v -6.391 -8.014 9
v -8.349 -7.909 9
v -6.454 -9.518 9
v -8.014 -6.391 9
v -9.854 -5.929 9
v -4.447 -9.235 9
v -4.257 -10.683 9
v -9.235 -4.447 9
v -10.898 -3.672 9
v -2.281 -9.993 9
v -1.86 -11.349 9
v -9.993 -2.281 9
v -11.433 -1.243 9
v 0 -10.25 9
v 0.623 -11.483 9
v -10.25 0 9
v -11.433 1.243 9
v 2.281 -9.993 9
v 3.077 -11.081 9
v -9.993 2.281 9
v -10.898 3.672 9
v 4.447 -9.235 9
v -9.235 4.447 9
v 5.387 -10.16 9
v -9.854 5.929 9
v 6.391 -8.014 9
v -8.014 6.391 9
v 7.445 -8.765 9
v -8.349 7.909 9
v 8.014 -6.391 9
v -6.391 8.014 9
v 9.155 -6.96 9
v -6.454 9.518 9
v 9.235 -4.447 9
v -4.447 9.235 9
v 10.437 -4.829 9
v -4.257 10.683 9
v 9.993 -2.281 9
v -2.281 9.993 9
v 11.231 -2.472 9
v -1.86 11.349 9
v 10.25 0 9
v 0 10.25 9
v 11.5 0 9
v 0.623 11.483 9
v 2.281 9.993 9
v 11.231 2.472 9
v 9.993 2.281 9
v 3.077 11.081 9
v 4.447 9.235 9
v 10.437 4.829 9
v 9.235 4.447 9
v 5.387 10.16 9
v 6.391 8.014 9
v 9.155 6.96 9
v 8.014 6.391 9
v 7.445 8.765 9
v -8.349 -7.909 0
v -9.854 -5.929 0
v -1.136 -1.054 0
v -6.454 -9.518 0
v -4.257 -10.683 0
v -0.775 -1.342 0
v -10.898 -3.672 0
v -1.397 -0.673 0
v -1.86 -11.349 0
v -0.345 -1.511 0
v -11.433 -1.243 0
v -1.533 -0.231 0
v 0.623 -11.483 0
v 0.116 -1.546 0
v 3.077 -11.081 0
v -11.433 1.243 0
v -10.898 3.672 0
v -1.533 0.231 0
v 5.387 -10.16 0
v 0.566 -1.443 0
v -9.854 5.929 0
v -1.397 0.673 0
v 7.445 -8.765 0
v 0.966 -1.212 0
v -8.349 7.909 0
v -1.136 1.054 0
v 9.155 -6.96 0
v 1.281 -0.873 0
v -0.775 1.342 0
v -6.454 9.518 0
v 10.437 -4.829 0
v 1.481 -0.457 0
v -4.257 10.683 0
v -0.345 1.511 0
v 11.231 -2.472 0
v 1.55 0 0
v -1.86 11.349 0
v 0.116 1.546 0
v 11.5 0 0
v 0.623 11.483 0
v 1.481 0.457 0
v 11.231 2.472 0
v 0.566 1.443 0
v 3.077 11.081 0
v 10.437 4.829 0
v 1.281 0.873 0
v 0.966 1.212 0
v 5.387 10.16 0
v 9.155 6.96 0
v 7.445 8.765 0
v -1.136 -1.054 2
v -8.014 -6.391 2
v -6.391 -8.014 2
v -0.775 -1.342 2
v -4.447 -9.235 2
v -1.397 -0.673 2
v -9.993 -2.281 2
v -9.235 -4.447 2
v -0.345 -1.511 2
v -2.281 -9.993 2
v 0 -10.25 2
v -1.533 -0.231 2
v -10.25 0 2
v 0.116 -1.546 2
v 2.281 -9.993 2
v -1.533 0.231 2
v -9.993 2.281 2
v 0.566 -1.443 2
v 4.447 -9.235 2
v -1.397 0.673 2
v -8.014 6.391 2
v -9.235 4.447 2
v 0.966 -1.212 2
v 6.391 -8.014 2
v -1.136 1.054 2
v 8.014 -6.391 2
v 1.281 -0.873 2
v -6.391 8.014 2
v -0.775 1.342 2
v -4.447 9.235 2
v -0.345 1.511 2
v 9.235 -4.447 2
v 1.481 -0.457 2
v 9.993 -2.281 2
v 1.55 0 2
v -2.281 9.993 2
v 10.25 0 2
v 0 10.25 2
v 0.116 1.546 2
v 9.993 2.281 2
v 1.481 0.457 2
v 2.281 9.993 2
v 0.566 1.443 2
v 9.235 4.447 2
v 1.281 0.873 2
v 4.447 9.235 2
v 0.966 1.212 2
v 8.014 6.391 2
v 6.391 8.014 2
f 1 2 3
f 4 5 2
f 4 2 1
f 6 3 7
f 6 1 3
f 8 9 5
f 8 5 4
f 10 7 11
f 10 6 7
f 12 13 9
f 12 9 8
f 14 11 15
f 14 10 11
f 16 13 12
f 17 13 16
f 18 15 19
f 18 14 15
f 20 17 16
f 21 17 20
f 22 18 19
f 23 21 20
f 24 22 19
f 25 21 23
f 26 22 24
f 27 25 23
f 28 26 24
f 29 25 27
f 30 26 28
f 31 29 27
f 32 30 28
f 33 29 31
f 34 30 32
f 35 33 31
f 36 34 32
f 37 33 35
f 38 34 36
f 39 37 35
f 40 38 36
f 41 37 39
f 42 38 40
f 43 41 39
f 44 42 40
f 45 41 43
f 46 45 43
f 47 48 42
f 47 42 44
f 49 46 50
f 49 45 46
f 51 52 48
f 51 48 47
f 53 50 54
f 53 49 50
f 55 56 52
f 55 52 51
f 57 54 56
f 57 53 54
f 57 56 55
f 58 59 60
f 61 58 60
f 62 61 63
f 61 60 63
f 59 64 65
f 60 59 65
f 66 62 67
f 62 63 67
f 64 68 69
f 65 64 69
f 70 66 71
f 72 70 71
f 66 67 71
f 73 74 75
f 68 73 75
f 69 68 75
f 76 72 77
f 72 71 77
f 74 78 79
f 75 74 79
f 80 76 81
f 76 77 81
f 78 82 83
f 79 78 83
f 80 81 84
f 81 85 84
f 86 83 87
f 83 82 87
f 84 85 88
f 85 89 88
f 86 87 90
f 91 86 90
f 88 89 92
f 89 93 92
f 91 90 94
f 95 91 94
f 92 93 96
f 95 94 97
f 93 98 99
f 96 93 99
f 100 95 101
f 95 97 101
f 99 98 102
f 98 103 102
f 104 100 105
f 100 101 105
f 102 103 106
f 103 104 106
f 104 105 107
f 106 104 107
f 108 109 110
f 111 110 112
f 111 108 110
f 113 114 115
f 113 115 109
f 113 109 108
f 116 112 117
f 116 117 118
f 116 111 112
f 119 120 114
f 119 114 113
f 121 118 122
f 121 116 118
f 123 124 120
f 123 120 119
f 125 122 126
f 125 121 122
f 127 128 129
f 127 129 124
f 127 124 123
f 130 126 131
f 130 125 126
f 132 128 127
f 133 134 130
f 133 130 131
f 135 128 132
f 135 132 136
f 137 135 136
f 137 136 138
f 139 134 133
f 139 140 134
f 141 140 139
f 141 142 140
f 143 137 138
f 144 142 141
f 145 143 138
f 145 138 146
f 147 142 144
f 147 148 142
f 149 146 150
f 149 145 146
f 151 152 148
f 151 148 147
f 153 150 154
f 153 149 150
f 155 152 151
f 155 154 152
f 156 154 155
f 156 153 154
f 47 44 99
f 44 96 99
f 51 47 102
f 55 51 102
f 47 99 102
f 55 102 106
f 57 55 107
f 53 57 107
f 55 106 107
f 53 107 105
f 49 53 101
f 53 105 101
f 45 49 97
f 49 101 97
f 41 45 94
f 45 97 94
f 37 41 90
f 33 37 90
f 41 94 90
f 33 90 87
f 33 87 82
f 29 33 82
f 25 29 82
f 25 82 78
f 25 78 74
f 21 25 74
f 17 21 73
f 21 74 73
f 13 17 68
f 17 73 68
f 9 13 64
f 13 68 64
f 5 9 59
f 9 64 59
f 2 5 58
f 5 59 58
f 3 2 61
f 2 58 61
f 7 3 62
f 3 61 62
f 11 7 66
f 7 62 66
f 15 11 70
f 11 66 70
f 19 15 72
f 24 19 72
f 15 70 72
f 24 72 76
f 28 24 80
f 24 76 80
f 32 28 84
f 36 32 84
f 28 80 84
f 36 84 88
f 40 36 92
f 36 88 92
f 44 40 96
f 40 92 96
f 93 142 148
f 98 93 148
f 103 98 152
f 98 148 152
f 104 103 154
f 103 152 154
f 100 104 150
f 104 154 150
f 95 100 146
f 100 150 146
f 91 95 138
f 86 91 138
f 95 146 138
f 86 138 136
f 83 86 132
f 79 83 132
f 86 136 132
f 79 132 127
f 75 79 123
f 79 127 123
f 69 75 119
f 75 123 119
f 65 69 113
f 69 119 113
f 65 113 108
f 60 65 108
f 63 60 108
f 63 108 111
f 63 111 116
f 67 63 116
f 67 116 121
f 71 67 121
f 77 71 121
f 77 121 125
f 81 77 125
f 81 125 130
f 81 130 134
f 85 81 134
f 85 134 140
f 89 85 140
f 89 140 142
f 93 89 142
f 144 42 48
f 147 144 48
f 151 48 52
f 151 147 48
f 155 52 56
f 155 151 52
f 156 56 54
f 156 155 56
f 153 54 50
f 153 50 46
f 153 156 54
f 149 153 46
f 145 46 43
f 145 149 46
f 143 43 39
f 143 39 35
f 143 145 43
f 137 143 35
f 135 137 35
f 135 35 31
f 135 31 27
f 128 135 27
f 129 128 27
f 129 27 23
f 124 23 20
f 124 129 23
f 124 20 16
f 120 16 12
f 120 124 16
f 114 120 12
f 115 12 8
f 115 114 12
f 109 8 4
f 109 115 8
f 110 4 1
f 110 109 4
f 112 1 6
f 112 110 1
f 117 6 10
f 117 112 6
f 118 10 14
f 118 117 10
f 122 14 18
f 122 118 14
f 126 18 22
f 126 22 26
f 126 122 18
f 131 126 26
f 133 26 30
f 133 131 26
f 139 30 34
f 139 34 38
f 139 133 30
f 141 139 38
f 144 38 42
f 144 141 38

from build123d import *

# Parameters (mm, degrees)
F0_R     = 11.5
F1_DEPTH = 2
F2_R     = 11.5
F2_R_2   = 10.25
F3_DEPTH = 7
F2_R_3   = 1.55
F4_DEPTH = 25


with BuildPart() as f1:
    # F0 (on Top) → F1 (new body)
    with BuildSketch(Plane.XY):
        Circle(F0_R)
    extrude(amount=F1_DEPTH)

    # F2 (on face) → F3 (join)
    with BuildSketch(Plane.XY.offset(2)):
        Circle(F2_R)
        Circle(F2_R_2, mode=Mode.SUBTRACT)
    extrude(amount=F3_DEPTH)

    # F2 (on face) → F4 (cut)
    with BuildSketch(Plane.XY.offset(2)):
        Circle(F2_R_3)
    extrude(amount=-F4_DEPTH, mode=Mode.SUBTRACT)


solid = f1.part
